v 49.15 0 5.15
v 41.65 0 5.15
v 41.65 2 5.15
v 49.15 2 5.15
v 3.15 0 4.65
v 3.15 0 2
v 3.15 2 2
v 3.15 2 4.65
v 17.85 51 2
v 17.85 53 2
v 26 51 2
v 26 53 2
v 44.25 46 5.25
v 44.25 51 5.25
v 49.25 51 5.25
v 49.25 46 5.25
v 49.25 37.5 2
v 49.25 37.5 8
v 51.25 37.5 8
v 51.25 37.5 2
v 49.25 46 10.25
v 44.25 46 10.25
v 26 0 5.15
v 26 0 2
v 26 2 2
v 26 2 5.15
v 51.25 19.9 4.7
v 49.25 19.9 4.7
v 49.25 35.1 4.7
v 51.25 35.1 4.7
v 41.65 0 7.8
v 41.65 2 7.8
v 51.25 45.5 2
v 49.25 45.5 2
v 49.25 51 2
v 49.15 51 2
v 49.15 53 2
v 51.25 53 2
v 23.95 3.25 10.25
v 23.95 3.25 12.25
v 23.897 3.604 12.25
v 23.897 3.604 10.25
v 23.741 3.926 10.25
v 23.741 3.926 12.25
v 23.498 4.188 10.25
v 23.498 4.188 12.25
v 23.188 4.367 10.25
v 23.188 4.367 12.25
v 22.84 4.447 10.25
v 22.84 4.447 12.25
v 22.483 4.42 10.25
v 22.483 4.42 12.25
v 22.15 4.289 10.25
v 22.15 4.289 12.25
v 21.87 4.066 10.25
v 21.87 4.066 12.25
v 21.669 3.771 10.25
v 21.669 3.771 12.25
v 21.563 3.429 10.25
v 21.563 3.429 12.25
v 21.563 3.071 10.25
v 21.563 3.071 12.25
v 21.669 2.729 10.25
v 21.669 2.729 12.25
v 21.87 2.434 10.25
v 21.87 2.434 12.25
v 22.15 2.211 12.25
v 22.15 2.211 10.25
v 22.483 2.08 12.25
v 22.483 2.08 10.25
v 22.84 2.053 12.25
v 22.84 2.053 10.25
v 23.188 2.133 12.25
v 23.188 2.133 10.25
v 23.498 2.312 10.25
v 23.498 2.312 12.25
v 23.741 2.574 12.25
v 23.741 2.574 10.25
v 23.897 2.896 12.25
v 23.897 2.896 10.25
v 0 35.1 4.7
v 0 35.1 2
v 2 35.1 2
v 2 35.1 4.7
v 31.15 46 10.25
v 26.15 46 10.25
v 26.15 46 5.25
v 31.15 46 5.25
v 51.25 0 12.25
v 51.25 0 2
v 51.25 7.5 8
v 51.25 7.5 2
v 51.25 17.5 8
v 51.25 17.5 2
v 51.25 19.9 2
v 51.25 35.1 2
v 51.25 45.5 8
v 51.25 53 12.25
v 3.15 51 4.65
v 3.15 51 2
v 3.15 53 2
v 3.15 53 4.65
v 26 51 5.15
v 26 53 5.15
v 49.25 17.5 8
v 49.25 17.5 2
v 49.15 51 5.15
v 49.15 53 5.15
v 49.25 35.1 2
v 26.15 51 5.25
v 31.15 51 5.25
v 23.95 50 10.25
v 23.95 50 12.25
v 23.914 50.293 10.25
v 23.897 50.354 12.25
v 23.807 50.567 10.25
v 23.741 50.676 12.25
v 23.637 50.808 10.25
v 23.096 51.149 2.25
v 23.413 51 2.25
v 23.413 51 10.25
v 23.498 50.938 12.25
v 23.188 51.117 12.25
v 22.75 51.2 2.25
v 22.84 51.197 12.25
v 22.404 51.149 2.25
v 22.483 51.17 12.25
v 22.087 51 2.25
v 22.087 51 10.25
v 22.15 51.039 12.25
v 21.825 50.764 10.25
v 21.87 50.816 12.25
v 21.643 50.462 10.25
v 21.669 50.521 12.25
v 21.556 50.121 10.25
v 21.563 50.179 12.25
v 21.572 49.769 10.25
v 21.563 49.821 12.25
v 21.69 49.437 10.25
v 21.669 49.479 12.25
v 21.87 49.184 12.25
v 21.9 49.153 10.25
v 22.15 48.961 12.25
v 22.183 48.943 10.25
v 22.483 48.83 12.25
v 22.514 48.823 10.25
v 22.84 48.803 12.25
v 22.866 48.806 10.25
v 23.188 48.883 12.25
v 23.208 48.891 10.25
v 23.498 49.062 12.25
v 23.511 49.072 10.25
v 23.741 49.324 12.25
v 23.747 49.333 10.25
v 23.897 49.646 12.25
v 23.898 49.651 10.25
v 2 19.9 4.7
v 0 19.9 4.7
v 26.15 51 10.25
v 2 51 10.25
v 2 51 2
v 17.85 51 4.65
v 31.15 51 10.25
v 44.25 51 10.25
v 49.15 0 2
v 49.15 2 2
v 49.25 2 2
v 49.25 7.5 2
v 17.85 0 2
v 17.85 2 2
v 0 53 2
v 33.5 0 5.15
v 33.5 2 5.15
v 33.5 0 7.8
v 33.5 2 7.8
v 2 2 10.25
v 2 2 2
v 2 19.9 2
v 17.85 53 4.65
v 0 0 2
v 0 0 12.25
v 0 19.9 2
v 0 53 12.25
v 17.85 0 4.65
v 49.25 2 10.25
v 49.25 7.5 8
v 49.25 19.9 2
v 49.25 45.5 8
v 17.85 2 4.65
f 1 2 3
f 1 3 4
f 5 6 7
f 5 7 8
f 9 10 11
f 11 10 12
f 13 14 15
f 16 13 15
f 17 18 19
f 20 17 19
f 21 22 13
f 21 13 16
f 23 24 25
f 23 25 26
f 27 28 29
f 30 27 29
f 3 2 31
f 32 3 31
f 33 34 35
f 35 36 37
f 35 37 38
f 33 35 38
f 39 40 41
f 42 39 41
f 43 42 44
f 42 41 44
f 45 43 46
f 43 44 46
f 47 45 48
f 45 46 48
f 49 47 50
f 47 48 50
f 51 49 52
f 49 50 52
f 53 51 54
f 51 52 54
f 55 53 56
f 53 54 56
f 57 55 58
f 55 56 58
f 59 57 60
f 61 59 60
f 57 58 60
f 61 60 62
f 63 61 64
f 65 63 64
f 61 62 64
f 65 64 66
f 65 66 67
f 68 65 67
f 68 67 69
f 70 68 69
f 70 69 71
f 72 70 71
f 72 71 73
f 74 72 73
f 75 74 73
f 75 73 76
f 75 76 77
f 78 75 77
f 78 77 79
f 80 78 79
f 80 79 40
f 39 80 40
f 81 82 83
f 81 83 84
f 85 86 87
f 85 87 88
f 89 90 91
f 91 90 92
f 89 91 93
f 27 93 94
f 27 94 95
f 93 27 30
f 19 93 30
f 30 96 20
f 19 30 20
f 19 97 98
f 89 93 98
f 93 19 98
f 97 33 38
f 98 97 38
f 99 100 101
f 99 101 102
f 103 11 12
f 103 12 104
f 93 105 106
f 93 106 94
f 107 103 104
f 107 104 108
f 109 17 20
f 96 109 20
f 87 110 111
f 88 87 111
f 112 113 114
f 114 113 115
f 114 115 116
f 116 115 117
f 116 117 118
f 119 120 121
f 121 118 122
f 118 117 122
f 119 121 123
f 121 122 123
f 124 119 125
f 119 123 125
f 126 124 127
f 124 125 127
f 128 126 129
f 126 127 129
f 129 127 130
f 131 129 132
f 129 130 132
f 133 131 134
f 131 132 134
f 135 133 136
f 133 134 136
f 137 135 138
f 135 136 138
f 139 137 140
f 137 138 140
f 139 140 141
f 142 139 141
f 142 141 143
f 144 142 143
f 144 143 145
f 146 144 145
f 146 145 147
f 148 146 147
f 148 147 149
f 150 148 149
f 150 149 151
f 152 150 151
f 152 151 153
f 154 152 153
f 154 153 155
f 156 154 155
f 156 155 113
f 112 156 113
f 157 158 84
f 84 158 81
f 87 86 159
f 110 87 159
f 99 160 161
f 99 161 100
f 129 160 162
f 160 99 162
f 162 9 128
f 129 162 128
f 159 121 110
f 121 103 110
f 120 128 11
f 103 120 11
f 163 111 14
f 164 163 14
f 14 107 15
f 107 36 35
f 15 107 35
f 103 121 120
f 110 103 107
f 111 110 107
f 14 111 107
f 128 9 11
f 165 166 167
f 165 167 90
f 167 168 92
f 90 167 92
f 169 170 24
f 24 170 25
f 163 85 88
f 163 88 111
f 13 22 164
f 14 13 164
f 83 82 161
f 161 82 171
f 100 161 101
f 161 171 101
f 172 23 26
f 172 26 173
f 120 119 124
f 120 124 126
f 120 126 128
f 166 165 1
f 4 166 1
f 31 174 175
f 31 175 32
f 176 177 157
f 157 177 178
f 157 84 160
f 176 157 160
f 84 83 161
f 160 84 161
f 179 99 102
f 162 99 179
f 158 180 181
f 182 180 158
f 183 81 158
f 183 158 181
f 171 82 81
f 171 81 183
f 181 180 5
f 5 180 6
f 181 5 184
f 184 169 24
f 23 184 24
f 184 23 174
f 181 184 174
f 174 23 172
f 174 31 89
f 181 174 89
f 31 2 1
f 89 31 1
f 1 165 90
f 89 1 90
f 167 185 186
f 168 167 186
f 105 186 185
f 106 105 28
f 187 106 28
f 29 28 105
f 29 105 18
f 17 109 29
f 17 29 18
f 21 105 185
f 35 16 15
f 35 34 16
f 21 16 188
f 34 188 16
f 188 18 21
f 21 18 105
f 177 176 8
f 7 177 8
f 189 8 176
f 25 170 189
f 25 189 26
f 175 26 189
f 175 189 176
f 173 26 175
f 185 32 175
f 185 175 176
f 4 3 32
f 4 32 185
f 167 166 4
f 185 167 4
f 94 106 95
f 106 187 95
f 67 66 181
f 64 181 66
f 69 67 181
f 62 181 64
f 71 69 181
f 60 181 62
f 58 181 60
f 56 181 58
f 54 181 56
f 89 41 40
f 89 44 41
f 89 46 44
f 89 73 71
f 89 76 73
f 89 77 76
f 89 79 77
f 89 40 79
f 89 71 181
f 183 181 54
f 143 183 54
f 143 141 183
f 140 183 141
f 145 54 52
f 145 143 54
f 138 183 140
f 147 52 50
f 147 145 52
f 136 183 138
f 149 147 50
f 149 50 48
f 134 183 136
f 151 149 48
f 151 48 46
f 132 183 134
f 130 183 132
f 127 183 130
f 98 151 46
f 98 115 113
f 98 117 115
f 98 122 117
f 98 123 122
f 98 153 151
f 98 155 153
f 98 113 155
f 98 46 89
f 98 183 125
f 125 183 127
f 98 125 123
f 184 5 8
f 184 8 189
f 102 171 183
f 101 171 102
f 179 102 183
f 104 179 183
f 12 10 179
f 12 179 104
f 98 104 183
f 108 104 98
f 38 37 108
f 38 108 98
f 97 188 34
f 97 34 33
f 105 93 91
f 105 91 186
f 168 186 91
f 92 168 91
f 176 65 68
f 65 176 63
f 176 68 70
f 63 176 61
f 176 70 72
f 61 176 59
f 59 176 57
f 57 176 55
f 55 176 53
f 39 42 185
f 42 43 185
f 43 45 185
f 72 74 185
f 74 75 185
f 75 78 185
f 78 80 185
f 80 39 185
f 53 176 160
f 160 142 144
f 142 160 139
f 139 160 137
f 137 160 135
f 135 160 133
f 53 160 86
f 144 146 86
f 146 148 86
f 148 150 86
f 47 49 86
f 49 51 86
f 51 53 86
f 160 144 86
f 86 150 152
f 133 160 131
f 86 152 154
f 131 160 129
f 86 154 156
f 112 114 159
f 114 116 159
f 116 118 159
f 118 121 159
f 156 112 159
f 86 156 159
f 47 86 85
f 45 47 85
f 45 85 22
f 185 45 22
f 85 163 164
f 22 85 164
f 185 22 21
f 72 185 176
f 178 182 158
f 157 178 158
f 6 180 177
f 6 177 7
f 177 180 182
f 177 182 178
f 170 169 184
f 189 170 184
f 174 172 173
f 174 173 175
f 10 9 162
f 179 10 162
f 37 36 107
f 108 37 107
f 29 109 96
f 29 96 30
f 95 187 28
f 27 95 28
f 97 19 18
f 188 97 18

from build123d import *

# Parameters (mm, degrees)
EXTRUDE024_DEPTH = 8
EXTRUDE023_DEPTH = 10
SKETCH017_W      = 8.15
SKETCH017_H      = 2.65
EXTRUDE013_DEPTH = 2
SKETCH016_R      = 1.2
EXTRUDE012_DEPTH = 10
SKETCH010_W      = 14.7
SKETCH010_H      = 2.65
SKETCH010_W_2    = 23.15
SKETCH010_H_2    = 3.15
EXTRUDE006_DEPTH = 53
SKETCH011_W      = 15.2
SKETCH011_H      = 2.7
EXTRUDE007_DEPTH = 51.25
SKETCH009_W      = 51.25
SKETCH009_H      = 53
SKETCH009_W_2    = 47.25
SKETCH009_H_2    = 49
EXTRUDE004_DEPTH = 10
SKETCH008_W      = 51.25
SKETCH008_H      = 53
EXTRUDE003_DEPTH = 2
SKETCH028_W      = 5
SKETCH028_H      = 5
EXTRUDE025_DEPTH = 5


with BuildPart() as cuts003:
    # Sketch027 → Extrude024 (new body)
    with BuildSketch(Plane.XZ):
        with BuildLine():
            Line((49.15, 2), (53.120454, 2))
            ThreePointArc((53.120454, 2), (52.24615, 3.831644), (51.25, 5.59998))
            Line((51.25, 8), (51.25, 5.59998))
            Line((51.25, 8), (49.15, 8))
            Line((49.15, 8), (49.15, 2))
        make_face()
    extrude(amount=-EXTRUDE024_DEPTH)


with BuildPart() as cuts003_1:
    # Extrude024 placement: moved
    add(cuts003.part.moved(Location((0, 37.5, 0))))


with BuildPart() as topcut001:
    # Sketch026 → Extrude023 (new body)
    with BuildSketch(Plane.XZ):
        with BuildLine():
            Line((49.15, 2), (53.120454, 2))
            ThreePointArc((53.120454, 2), (52.24615, 3.831644), (51.25, 5.59998))
            Line((51.25, 8), (51.25, 5.59998))
            Line((51.25, 8), (49.15, 8))
            Line((49.15, 8), (49.15, 2))
        make_face()
    extrude(amount=-EXTRUDE023_DEPTH)


with BuildPart() as topcut001_1:
    # Extrude023 placement: moved
    add(topcut001.part.moved(Location((0, 7.5, 0))))

    # Fusion005: union cuts003
    add(cuts003_1.part)


with BuildPart() as extrude013:
    # Sketch017 → Extrude013 (new body)
    with BuildSketch(Plane.XZ):
        with Locations((37.575, 6.475)):
            Rectangle(SKETCH017_W, SKETCH017_H)
    extrude(amount=-EXTRUDE013_DEPTH)


with BuildPart() as topcut:
    # Sketch016 → Extrude012 (new body)
    with BuildSketch(Plane.XY):
        with Locations((22.75, 50)):
            Circle(SKETCH016_R)
        with Locations((22.75, 3.25)):
            Circle(SKETCH016_R)
    extrude(amount=-EXTRUDE012_DEPTH)


with BuildPart() as topcut_1:
    # Extrude012 placement: moved
    add(topcut.part.moved(Location((0, 0, 12.25))))


with BuildPart() as topcuts:
    # Sketch010 → Extrude006 (new body)
    with BuildSketch(Plane.XZ):
        with Locations((10.5, 3.325)):
            Rectangle(SKETCH010_W, SKETCH010_H)
        with Locations((37.575, 3.575)):
            Rectangle(SKETCH010_W_2, SKETCH010_H_2)
    extrude(amount=-EXTRUDE006_DEPTH)


with BuildPart() as fusion001:
    # Sketch011 → Extrude007 (new body)
    with BuildSketch(Plane.YZ):
        with Locations((27.5, 3.35)):
            Rectangle(SKETCH011_W, SKETCH011_H)
    extrude(amount=EXTRUDE007_DEPTH)

    # Fusion001: union topCuts
    add(topcuts.part)


with BuildPart() as top:
    # Sketch009 → Extrude004 (new body)
    with BuildSketch(Plane.XY):
        with Locations((25.625, 26.5)):
            Rectangle(SKETCH009_W, SKETCH009_H)
        with Locations((25.625, 26.5)):
            Rectangle(SKETCH009_W_2, SKETCH009_H_2, mode=Mode.SUBTRACT)
    extrude(amount=EXTRUDE004_DEPTH)


with BuildPart() as top_1:
    # Extrude004 placement: moved
    add(top.part.moved(Location((0, 0, 2))))


with BuildPart() as top005:
    # Sketch008 → Extrude003 (new body)
    with BuildSketch(Plane.XY):
        with Locations((25.625, 26.5)):
            Rectangle(SKETCH008_W, SKETCH008_H)
    extrude(amount=EXTRUDE003_DEPTH)


with BuildPart() as top005_1:
    # Extrude003 placement: moved
    add(top005.part.moved(Location((0, 0, 10.25))))

    # Fusion: union top
    add(top_1.part)

    # Cut001: cut Fusion001
    add(fusion001.part, mode=Mode.SUBTRACT)

    # Cut003: cut topCut
    add(topcut_1.part, mode=Mode.SUBTRACT)

    # Cut005: cut Extrude013
    add(extrude013.part, mode=Mode.SUBTRACT)


with BuildPart() as top008:
    # Sketch028 → Extrude025 (new body)
    with BuildSketch(Plane.XY.offset(10.25)):
        with Locations((28.65, 48.5)):
            Rectangle(SKETCH028_W, SKETCH028_H)
        with Locations((46.75, 48.5)):
            Rectangle(SKETCH028_W, SKETCH028_H)
    extrude(amount=-EXTRUDE025_DEPTH)

    # Fusion006: union top005
    add(top005_1.part)

    # Cut: cut topCut001
    add(topcut001_1.part, mode=Mode.SUBTRACT)


solid = top008.part
